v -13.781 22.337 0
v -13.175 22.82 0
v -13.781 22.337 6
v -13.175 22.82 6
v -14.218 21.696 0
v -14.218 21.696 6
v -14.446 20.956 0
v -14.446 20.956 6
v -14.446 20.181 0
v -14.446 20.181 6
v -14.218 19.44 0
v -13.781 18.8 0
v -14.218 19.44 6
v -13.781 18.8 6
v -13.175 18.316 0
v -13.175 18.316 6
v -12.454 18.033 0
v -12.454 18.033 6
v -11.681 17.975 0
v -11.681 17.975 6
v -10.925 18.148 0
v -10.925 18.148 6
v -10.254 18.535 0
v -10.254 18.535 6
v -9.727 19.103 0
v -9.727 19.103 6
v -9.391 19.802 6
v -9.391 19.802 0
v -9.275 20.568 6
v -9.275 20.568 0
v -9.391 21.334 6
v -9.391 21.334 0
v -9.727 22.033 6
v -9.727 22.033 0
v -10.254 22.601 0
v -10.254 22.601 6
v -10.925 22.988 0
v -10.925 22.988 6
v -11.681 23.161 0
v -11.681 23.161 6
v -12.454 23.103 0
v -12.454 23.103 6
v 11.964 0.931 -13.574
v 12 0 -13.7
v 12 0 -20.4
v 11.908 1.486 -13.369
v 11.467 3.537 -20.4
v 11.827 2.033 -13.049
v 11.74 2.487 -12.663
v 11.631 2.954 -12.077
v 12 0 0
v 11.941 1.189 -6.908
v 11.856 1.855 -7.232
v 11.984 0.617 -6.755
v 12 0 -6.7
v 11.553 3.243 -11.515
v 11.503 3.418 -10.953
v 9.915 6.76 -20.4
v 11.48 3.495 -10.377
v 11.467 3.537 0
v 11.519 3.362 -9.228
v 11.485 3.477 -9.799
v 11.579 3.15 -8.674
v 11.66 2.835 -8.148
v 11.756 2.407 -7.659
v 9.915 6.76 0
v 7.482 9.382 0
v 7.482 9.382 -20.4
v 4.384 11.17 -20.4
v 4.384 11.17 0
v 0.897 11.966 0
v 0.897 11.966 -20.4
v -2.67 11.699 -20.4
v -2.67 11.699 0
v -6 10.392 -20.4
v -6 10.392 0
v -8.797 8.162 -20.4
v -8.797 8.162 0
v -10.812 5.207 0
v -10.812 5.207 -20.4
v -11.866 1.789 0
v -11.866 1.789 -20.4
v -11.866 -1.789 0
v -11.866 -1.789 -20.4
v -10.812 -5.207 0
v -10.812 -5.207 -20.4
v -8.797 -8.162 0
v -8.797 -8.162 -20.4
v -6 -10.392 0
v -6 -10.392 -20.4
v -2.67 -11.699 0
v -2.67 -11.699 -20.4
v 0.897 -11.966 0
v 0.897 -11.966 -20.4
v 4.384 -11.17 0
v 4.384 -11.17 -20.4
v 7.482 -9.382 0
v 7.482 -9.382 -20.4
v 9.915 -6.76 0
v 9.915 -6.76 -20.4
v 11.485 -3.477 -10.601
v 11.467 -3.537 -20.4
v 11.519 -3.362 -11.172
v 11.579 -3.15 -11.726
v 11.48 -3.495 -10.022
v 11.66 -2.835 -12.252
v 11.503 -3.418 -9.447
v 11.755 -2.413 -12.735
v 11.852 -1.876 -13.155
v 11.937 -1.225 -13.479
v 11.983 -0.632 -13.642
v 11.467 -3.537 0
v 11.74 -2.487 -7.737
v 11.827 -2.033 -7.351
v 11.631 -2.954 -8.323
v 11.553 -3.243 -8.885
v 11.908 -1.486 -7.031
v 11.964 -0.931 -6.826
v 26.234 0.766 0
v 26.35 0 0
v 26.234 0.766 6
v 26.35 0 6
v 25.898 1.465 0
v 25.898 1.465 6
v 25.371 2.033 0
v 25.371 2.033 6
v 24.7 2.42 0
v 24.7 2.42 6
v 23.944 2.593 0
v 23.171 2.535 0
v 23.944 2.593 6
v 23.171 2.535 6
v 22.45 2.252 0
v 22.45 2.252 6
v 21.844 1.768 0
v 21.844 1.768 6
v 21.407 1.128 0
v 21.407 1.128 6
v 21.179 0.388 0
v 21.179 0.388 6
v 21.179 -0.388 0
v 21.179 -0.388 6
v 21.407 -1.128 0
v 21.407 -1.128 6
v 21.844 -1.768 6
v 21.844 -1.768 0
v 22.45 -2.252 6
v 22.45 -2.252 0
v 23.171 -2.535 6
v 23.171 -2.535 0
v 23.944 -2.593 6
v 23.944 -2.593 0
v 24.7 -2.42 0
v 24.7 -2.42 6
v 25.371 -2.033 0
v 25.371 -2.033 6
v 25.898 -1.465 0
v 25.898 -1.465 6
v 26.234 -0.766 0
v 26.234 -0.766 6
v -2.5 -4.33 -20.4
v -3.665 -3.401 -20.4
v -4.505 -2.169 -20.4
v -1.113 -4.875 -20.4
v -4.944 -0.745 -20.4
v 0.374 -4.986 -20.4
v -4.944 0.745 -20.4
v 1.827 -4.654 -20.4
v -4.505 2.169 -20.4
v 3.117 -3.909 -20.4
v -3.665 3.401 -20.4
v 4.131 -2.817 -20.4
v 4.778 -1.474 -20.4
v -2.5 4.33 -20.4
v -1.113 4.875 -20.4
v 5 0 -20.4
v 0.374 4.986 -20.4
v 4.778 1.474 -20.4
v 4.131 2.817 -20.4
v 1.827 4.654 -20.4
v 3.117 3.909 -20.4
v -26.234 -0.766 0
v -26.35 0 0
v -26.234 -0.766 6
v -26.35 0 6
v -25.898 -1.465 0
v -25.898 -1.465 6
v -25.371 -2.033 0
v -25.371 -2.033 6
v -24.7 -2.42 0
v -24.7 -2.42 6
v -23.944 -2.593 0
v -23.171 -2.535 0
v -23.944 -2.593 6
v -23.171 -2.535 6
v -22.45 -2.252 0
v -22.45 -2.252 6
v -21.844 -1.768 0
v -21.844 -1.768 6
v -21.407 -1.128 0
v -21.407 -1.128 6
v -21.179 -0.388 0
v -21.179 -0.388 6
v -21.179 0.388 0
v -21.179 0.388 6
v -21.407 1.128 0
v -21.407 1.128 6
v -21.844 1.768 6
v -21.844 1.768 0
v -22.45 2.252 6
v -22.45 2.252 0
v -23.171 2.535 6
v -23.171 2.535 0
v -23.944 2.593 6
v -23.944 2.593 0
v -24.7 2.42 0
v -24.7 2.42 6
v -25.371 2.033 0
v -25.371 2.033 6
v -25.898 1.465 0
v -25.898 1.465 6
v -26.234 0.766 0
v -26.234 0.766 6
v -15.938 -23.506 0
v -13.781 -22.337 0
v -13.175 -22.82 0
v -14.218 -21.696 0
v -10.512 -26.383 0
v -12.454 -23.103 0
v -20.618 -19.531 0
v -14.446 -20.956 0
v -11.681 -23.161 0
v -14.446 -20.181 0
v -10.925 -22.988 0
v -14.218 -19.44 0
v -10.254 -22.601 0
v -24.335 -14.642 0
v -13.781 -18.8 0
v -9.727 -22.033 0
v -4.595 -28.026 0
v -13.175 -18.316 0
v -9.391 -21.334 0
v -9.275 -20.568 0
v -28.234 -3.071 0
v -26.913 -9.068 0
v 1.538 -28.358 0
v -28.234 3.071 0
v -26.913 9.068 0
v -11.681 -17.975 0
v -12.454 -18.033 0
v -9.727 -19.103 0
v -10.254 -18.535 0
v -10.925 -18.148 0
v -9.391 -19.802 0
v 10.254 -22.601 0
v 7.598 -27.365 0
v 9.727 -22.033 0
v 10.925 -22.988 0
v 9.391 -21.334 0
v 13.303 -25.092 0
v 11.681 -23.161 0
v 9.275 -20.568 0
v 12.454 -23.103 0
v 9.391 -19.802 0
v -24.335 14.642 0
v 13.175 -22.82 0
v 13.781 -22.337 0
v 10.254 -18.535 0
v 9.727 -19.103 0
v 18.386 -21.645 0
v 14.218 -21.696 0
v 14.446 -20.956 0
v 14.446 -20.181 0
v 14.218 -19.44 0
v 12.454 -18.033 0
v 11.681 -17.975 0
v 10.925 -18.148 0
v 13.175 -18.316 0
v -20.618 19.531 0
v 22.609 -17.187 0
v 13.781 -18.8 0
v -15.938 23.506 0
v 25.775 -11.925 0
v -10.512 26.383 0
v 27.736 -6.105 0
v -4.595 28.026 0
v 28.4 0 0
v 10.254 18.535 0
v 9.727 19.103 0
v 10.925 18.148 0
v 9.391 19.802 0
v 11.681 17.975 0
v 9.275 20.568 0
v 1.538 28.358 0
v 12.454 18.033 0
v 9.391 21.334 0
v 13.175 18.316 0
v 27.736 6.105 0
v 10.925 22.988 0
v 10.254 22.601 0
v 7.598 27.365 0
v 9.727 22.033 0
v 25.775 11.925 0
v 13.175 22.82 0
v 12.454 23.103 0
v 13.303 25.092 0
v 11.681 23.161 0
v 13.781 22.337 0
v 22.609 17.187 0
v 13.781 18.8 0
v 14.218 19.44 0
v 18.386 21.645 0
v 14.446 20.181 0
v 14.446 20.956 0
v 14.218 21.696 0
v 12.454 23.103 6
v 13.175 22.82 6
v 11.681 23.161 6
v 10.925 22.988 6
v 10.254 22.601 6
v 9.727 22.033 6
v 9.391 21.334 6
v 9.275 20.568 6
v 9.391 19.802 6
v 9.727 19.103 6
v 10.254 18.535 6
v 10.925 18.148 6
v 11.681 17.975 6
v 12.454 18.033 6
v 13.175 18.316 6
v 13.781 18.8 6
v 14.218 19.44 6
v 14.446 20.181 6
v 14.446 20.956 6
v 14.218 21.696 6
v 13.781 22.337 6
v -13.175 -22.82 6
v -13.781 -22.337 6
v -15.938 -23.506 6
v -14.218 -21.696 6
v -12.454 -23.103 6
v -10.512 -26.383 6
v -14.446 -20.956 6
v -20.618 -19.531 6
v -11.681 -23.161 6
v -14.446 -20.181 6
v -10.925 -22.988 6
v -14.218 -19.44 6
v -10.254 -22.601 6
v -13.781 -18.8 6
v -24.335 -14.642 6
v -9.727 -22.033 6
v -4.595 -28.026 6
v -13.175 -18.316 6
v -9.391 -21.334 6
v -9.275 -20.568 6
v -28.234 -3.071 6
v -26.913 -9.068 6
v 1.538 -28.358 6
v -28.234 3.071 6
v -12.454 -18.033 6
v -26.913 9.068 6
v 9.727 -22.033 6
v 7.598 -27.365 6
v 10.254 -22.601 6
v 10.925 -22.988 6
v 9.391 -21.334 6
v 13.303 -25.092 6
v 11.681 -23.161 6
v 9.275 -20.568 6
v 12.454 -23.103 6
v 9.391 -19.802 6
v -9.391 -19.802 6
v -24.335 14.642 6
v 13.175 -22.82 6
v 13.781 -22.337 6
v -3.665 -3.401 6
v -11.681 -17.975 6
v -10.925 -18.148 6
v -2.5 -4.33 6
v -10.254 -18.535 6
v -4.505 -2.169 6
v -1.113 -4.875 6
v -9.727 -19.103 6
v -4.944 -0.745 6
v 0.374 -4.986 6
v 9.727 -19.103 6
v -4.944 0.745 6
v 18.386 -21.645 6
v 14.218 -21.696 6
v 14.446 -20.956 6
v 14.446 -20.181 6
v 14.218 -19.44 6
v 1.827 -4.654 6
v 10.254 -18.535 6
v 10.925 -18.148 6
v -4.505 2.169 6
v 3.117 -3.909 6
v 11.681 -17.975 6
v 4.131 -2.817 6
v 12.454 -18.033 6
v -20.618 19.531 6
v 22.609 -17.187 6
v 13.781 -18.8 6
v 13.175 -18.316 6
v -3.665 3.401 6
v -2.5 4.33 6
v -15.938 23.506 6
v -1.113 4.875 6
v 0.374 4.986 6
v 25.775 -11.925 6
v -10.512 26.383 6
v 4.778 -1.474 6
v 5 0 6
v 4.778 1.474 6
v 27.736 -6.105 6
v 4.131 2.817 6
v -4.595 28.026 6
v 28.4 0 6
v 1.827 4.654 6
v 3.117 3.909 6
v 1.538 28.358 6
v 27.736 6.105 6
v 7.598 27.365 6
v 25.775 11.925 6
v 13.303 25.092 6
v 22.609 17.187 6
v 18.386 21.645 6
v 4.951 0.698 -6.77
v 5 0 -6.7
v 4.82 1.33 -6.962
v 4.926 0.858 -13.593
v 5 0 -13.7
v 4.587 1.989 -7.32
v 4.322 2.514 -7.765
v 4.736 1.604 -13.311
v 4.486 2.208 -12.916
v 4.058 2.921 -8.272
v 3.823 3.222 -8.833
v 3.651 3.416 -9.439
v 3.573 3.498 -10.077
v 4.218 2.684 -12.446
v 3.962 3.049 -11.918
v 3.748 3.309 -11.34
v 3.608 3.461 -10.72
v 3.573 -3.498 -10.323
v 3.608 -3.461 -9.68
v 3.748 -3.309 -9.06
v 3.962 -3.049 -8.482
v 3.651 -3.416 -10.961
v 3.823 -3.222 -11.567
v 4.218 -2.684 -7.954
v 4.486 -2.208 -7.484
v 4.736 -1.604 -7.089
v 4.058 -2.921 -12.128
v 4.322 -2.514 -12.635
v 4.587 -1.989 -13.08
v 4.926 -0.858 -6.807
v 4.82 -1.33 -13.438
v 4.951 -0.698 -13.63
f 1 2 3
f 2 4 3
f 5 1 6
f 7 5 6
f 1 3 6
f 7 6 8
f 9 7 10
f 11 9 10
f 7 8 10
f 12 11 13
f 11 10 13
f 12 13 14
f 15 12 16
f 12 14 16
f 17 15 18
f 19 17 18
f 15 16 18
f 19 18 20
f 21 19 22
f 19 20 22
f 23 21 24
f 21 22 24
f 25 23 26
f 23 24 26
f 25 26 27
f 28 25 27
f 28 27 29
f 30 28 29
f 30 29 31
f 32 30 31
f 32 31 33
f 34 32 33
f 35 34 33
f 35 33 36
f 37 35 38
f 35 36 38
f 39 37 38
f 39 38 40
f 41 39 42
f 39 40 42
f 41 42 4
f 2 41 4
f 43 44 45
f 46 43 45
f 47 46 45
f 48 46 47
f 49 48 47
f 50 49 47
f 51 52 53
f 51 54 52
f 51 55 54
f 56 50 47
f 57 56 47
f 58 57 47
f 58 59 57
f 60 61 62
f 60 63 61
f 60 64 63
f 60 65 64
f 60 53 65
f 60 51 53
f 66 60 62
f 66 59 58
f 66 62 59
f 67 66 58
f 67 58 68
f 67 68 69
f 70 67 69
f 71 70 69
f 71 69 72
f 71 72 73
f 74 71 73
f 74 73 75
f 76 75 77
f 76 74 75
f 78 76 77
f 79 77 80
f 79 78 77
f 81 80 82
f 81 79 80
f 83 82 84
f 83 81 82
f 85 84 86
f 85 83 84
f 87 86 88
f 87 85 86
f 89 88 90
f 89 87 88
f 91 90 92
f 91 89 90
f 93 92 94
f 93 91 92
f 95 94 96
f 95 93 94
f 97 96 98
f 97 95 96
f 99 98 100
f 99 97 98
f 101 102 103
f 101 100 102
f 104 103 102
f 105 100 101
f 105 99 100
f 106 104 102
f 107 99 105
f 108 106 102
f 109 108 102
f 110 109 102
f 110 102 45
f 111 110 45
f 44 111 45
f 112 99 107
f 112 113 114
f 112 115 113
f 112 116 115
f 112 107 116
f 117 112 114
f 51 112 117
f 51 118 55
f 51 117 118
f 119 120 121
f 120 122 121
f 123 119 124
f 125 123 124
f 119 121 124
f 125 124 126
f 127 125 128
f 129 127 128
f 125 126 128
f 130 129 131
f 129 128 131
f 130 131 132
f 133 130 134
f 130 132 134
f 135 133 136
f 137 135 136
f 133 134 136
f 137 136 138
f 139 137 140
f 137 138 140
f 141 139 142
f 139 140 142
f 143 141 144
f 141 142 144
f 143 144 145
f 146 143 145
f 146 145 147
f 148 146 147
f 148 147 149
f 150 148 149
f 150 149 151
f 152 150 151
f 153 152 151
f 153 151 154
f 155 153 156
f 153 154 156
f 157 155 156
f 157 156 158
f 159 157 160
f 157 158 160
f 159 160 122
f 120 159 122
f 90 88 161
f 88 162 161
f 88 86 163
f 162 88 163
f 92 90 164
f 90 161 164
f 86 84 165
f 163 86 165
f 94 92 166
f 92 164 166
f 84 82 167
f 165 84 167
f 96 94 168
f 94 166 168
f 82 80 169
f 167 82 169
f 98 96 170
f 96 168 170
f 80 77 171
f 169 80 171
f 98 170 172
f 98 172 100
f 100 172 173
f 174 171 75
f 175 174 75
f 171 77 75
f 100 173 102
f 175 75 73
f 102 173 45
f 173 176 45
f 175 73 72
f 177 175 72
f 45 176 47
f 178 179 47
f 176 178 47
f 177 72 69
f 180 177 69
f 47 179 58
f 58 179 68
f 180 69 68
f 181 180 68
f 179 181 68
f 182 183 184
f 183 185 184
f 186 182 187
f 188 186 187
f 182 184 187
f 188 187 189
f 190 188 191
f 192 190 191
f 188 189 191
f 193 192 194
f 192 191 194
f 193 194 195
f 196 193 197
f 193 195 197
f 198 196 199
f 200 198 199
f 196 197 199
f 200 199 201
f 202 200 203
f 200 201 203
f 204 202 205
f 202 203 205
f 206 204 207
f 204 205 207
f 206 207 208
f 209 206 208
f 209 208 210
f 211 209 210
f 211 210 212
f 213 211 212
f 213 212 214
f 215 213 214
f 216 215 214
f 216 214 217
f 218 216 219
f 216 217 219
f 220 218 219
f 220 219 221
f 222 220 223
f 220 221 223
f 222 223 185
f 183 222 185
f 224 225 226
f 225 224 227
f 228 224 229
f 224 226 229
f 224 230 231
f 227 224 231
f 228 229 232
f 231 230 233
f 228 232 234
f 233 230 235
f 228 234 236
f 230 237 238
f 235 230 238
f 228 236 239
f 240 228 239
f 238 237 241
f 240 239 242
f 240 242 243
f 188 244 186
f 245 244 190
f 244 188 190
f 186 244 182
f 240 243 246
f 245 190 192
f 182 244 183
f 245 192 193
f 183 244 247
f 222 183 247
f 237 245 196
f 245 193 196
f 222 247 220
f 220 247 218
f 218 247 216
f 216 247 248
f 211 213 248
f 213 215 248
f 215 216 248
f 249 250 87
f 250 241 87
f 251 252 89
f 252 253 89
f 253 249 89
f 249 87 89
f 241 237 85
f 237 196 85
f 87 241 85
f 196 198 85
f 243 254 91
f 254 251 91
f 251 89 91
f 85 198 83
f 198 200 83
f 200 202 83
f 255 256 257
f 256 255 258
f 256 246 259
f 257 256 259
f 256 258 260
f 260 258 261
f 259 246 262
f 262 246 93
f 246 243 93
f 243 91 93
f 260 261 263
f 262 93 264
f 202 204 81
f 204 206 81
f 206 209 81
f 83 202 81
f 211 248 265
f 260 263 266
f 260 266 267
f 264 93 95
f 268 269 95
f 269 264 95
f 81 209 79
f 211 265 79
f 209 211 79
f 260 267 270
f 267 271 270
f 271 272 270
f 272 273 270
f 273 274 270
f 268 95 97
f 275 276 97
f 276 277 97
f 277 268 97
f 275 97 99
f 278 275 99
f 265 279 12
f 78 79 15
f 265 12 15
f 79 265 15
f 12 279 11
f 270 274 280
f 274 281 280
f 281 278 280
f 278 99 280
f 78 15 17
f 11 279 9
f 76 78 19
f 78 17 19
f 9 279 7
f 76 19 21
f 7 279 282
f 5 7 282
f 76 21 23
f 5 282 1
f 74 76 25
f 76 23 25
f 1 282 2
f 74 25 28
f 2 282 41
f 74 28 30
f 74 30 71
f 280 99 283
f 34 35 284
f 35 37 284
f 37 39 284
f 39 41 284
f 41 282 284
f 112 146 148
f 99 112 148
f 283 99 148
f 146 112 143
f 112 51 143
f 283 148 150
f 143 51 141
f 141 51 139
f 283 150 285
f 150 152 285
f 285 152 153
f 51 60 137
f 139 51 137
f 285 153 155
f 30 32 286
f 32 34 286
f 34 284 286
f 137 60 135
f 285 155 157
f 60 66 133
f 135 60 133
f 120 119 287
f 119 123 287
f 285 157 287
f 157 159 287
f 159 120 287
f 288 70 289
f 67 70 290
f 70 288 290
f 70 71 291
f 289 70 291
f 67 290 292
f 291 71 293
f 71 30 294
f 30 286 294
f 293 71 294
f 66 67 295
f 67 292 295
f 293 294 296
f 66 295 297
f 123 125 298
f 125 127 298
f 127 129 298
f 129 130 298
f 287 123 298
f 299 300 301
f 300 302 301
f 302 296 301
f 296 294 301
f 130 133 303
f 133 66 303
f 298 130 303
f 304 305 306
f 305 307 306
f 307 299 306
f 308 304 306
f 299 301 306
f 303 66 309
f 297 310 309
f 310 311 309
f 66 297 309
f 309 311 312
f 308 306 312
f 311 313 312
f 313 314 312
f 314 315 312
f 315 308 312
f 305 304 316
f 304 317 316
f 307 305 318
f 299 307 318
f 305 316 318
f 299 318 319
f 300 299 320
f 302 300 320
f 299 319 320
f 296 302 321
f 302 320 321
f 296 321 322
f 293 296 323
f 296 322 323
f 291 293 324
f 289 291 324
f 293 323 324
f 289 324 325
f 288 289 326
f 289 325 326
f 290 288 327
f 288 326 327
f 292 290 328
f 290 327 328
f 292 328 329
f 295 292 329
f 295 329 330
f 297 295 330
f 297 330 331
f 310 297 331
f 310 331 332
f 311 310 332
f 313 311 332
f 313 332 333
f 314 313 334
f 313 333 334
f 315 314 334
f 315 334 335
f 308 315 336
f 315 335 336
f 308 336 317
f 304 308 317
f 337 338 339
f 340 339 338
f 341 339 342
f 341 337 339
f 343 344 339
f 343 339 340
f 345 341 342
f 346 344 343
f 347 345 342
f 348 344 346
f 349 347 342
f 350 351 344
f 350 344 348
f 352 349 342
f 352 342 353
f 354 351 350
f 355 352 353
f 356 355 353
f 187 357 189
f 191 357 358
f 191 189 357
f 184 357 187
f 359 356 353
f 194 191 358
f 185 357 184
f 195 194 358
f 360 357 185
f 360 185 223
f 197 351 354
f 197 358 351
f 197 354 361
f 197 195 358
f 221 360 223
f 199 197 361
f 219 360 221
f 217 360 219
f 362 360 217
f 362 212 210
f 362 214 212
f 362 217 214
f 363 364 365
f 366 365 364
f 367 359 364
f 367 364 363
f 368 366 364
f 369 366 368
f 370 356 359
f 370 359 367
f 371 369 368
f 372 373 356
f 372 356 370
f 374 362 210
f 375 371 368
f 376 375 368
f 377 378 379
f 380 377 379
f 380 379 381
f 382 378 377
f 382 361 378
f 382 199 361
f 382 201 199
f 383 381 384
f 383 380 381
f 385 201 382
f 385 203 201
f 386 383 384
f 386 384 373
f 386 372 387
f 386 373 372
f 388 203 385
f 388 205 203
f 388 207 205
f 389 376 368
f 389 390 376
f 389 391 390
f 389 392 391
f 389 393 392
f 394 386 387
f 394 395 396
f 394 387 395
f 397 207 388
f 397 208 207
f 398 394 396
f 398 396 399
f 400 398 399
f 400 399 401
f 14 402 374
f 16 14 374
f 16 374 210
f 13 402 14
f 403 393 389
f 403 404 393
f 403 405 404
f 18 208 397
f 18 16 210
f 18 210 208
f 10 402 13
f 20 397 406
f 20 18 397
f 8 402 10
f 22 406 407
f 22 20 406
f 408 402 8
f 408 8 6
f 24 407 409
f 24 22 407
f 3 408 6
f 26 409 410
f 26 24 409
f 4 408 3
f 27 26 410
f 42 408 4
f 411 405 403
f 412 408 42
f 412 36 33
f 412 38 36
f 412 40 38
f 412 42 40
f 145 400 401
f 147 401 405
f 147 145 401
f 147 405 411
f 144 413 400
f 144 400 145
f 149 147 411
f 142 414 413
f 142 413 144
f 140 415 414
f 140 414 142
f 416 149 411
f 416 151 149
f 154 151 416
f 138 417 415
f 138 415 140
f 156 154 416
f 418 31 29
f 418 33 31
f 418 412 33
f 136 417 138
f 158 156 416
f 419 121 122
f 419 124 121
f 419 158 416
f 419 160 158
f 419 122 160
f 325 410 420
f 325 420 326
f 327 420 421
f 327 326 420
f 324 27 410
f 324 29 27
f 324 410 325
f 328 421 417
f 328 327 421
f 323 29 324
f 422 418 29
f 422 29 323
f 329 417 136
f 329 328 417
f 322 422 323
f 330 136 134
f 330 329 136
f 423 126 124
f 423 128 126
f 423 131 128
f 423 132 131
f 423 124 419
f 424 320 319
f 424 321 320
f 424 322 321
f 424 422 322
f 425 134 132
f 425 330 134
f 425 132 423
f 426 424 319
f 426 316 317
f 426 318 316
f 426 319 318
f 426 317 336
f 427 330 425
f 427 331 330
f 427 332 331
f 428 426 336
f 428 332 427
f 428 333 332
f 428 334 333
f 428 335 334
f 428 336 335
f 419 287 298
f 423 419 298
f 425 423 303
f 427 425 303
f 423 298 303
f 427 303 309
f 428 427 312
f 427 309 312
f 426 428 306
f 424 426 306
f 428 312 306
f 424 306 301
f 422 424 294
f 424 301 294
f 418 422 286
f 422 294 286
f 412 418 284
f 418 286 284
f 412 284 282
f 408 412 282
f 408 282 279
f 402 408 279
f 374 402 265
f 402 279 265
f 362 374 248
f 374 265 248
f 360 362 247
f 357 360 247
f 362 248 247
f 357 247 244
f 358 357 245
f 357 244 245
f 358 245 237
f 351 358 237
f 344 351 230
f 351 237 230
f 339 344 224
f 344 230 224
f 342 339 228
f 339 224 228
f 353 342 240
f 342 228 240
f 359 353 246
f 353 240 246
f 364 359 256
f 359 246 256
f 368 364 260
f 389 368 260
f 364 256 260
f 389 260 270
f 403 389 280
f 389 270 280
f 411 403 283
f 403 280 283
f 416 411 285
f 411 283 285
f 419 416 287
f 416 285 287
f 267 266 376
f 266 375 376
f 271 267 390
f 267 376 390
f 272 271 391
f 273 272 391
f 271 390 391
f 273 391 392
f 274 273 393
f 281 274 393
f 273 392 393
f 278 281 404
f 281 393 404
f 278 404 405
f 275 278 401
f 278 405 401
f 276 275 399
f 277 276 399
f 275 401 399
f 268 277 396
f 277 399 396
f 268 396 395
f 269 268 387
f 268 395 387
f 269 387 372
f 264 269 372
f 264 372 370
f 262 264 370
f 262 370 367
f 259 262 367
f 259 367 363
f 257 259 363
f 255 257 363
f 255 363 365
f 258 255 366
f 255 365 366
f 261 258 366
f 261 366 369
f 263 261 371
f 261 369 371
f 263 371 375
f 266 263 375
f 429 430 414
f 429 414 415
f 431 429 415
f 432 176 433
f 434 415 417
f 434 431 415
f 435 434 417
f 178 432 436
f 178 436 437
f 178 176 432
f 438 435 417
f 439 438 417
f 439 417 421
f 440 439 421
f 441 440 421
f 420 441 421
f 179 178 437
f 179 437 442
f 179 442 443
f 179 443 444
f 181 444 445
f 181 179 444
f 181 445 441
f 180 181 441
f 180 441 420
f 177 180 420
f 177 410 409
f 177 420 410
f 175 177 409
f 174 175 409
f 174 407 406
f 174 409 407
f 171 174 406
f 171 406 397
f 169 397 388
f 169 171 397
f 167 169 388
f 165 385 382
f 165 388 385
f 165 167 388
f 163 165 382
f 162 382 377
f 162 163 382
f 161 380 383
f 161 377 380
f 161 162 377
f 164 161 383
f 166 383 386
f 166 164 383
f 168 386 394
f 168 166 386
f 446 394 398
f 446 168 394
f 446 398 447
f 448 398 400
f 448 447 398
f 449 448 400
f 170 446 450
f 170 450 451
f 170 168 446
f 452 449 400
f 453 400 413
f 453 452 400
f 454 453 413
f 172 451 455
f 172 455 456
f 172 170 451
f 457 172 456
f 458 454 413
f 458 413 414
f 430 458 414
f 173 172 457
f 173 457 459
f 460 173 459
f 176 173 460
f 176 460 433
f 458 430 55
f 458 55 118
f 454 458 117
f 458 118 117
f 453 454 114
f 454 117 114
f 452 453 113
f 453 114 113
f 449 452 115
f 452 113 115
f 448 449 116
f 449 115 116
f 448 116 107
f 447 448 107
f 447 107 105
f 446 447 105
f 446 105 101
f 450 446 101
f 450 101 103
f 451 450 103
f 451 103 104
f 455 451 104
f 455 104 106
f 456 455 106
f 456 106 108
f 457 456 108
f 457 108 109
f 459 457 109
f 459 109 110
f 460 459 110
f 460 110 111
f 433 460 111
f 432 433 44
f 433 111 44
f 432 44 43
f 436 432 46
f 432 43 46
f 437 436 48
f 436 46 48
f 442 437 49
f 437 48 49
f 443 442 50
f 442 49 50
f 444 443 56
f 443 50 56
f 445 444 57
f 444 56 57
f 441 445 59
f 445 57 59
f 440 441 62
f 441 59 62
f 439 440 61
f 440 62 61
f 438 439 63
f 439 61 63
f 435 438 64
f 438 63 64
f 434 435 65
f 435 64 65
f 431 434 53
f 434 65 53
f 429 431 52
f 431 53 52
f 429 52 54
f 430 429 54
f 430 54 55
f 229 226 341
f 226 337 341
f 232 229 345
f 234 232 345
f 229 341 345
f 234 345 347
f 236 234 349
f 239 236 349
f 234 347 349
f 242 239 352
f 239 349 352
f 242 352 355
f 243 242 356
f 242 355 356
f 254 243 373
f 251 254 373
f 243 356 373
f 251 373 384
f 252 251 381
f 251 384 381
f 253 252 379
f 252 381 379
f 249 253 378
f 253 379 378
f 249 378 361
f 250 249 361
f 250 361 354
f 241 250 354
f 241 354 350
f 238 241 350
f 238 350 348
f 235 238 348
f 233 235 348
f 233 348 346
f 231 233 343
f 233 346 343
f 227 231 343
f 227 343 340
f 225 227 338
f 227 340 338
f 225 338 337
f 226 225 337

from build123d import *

# Parameters (mm, degrees)
SKETCH_1_R               = 28.4
EXTRUDE_1_DEPTH          = 6
SKETCH_2_R               = 12
EXTRUDE_2_DEPTH          = 20.4
CUT_EXTRUDE_1_DEPTH      = 46.047530454
CUT_EXTRUDE_1_DEPTH_BACK = 46.047530454
SKETCH_3_R               = 5
SKETCH_5_W               = 3.5
SKETCH_5_H               = 12
SKETCH_7_R               = 2.6
CUT_EXTRUDE_2_DEPTH      = 46.047530499
PATTERN_CIRCULAR_1_COUNT = 6


with BuildPart() as part:
    # ｽｹｯﾁ1 → ﾎﾞｽ - 押し出し1 (new body)
    with BuildSketch(Plane.XY):
        Circle(SKETCH_1_R)
    extrude(amount=EXTRUDE_1_DEPTH)

    # ｽｹｯﾁ2 → ﾎﾞｽ - 押し出し2 (add)
    with BuildSketch(Plane.XY):
        Circle(SKETCH_2_R)
    extrude(amount=-EXTRUDE_2_DEPTH)

    # ｽｹｯﾁ3 → ｶｯﾄ - 押し出し1 (cut, two sides: drawn at the far end of the back side and taken through both)
    with BuildSketch(Plane.XY.offset(-CUT_EXTRUDE_1_DEPTH_BACK)):
        Circle(SKETCH_3_R)
    extrude(amount=CUT_EXTRUDE_1_DEPTH + CUT_EXTRUDE_1_DEPTH_BACK, mode=Mode.SUBTRACT)

    # ｽｹｯﾁ5 → M6 すきま穴1 (revolve, cut)
    with BuildSketch(Plane(origin=(0, 0, -10.2), x_dir=(0, 0, 1), z_dir=(0, 1, 0))):
        with Locations((1.75, 6)):
            Rectangle(SKETCH_5_W, SKETCH_5_H)
    revolve(axis=Axis((-6.35, 0, -10.2), (1, 0, 0)), mode=Mode.SUBTRACT)

    # ｽｹｯﾁ7 → ｶｯﾄ - 押し出し2 (cut, symmetric)
    with BuildSketch(Plane.XY):
        with Locations((23.75, 0)):
            Circle(SKETCH_7_R)
    cut_extrude_2 = extrude(amount=CUT_EXTRUDE_2_DEPTH, both=True, mode=Mode.SUBTRACT)

    # 円形ﾊﾟﾀｰﾝ1: ｶｯﾄ - 押し出し2 ×6 about axis
    pattern_circular_1_axis = Axis((0, 0, 0), (0, 0, 1))
    for i in range(1, PATTERN_CIRCULAR_1_COUNT):
        add(cut_extrude_2.rotate(pattern_circular_1_axis, i * 360 / PATTERN_CIRCULAR_1_COUNT), mode=Mode.SUBTRACT)


solid = part.part
